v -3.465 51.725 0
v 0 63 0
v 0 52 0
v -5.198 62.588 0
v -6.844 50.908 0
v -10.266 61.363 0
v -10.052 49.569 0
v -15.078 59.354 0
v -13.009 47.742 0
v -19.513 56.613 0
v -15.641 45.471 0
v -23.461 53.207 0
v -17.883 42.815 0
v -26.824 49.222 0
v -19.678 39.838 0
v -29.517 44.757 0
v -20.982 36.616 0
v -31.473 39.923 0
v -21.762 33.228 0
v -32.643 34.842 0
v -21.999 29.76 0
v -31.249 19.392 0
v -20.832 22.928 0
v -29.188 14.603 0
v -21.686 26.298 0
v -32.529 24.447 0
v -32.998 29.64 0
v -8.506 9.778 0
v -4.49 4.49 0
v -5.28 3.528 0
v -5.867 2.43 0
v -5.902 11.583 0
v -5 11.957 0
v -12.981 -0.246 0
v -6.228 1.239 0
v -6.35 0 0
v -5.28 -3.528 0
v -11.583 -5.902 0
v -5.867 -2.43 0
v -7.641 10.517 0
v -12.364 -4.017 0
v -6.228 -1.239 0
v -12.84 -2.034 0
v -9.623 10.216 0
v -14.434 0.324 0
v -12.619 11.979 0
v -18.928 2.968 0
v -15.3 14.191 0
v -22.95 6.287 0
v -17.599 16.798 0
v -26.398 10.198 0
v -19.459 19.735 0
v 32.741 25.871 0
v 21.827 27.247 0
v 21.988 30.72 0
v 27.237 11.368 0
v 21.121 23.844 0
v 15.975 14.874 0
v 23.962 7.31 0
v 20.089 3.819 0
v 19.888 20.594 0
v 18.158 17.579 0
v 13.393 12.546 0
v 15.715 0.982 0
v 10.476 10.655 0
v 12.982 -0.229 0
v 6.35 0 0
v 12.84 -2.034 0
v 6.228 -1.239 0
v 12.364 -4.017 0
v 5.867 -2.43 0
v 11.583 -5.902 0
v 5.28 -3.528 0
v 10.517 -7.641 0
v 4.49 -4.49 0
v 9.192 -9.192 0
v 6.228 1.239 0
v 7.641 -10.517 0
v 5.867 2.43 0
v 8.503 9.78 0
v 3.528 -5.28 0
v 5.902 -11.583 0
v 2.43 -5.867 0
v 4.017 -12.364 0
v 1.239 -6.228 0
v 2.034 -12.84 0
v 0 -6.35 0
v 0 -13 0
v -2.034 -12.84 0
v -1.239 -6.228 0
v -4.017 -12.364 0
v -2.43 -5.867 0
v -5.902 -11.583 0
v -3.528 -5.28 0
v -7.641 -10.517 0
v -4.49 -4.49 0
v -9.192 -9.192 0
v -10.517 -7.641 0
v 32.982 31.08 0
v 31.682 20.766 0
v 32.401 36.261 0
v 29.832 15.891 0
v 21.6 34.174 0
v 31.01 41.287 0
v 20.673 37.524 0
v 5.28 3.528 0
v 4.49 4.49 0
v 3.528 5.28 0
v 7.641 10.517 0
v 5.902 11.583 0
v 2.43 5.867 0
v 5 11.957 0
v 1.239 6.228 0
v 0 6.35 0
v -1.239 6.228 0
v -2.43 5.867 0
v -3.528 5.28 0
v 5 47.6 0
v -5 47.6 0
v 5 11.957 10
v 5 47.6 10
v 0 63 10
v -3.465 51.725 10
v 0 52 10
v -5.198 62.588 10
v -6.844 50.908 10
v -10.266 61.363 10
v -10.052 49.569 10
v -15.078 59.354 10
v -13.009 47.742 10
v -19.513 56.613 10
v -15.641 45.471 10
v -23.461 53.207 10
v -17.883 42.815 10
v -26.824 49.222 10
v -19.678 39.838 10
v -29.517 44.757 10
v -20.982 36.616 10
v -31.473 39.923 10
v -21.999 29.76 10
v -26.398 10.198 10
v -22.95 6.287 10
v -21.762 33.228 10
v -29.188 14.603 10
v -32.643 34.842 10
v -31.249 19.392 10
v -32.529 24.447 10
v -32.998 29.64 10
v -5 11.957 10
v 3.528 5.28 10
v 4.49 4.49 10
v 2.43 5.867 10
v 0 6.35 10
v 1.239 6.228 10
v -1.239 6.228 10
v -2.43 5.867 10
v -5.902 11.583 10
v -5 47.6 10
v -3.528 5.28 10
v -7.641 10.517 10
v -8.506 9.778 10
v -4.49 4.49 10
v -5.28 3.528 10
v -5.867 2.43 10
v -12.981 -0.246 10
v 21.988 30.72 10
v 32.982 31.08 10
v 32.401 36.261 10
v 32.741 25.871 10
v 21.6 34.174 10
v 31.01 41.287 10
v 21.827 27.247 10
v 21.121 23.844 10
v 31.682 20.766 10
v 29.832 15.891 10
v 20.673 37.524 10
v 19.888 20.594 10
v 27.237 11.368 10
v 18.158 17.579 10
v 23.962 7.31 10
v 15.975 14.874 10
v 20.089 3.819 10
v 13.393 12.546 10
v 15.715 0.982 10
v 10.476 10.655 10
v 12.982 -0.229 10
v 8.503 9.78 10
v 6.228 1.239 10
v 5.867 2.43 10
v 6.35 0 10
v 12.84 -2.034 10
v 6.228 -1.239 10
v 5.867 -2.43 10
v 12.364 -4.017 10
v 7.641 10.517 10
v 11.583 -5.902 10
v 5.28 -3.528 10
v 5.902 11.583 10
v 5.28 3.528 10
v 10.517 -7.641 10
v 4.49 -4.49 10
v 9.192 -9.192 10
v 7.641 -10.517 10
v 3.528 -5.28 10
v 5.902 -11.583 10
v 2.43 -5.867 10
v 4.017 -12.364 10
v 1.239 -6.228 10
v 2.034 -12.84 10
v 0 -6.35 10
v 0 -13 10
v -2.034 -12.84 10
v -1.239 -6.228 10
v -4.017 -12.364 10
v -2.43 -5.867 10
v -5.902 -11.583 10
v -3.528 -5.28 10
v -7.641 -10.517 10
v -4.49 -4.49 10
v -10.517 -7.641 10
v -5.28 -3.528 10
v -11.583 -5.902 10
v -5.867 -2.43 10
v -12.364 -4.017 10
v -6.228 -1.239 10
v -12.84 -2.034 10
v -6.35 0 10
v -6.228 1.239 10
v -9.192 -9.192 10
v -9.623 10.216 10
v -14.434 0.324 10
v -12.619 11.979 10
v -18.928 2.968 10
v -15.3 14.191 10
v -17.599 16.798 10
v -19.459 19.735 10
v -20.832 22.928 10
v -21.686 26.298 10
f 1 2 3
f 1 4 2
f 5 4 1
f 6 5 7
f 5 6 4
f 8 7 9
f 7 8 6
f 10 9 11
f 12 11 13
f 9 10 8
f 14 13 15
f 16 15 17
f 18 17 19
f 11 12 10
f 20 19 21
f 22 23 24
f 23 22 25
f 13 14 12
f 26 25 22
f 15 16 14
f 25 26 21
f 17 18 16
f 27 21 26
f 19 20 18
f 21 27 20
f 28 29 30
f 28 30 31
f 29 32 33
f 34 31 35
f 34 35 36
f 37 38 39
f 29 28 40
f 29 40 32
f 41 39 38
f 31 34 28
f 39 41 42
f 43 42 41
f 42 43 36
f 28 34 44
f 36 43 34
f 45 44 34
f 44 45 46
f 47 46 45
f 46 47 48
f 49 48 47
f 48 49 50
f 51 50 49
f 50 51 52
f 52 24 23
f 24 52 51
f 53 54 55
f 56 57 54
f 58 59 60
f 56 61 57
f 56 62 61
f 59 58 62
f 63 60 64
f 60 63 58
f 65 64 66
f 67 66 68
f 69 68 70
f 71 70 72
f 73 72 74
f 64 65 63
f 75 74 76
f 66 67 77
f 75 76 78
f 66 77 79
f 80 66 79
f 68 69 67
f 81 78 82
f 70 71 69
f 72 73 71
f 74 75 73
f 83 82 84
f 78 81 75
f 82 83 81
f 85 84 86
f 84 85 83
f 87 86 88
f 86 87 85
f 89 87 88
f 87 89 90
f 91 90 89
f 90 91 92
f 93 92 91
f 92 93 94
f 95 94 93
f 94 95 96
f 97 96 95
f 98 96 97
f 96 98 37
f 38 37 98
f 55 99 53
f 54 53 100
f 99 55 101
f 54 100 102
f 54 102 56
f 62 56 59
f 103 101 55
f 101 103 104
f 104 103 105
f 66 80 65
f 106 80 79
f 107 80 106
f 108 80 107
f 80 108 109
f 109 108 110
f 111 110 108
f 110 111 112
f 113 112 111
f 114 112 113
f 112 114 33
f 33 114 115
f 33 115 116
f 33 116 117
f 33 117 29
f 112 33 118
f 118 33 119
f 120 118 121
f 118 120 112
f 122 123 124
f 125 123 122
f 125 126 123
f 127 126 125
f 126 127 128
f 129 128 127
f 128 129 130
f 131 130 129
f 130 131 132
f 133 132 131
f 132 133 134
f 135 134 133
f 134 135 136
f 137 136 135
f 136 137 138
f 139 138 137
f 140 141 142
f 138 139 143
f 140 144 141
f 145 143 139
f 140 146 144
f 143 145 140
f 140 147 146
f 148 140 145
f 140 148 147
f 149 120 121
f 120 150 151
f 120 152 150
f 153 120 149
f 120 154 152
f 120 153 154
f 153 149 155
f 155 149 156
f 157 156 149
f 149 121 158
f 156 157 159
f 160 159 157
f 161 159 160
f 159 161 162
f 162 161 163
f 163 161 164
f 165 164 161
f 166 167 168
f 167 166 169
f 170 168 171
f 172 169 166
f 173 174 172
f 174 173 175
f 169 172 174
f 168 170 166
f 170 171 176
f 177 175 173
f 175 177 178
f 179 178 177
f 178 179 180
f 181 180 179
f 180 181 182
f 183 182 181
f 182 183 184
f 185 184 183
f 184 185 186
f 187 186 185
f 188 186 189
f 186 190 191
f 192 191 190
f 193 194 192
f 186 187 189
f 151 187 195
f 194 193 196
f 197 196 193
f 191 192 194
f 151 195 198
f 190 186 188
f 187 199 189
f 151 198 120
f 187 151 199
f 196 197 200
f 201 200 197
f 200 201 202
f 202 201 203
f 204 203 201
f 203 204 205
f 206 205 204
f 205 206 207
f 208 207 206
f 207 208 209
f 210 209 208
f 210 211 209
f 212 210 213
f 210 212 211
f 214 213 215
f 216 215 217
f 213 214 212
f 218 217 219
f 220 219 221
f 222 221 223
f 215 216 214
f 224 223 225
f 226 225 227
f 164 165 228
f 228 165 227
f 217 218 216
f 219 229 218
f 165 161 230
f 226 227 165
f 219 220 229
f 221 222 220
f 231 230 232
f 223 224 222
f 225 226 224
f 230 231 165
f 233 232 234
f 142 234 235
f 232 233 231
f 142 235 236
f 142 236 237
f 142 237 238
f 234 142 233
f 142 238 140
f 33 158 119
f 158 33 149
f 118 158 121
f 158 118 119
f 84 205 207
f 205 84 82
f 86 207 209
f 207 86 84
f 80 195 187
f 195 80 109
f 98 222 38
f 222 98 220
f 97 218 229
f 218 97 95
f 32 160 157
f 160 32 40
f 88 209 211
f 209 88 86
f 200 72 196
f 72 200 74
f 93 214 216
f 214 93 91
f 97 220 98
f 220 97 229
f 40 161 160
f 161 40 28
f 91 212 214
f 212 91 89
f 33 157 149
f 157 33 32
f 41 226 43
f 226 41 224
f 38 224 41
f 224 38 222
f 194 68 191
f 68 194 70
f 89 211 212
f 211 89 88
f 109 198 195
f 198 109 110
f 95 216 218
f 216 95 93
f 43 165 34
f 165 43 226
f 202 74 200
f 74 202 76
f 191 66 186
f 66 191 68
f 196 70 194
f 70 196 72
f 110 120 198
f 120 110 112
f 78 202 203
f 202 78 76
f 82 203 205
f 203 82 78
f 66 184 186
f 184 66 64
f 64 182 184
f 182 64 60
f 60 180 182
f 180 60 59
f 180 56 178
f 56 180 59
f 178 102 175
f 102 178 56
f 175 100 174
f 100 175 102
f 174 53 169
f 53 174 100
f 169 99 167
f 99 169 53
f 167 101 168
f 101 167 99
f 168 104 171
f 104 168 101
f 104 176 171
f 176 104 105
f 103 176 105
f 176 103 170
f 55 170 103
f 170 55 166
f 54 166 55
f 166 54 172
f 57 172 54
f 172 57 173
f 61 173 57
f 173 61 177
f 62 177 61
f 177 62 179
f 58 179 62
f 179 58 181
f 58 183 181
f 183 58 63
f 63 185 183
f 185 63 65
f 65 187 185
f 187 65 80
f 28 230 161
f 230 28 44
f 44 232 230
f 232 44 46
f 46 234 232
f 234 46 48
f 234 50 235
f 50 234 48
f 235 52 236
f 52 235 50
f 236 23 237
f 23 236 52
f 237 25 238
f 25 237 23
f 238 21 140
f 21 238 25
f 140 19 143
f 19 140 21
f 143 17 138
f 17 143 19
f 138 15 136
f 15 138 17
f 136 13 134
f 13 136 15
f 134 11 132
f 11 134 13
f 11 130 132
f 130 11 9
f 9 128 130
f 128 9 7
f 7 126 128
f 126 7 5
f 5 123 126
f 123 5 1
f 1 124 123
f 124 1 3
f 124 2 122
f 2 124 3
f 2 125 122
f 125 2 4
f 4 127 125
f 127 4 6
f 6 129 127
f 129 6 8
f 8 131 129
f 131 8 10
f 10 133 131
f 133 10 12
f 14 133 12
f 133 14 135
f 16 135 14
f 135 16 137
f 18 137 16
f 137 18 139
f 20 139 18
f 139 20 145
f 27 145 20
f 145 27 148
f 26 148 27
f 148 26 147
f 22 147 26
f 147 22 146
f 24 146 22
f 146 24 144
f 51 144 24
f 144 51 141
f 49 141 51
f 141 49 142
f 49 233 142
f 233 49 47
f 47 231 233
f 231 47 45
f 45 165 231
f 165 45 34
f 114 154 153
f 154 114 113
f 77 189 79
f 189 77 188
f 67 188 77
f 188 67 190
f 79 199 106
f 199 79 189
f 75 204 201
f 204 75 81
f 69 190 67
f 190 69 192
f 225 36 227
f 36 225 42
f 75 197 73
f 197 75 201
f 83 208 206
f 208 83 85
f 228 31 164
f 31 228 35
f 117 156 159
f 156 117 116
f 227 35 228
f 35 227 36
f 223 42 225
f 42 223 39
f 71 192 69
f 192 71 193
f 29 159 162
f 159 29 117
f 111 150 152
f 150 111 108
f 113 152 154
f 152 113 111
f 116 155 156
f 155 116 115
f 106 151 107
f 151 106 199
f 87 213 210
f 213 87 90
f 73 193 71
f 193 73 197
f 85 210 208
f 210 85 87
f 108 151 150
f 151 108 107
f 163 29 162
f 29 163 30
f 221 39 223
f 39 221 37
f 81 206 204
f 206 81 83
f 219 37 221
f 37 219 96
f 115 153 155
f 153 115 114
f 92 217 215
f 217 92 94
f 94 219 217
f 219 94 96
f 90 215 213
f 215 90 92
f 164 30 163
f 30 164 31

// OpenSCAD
$fn = 32;

// ----------------------------------------------------------------------
// Hook: 60 mm shank into a 22 mm curl, 10 mm thick
// ----------------------------------------------------------------------

// --- parameters (mm) ---
shank_len = 60;           // shank length from the boss centre
shank_w = 10;             // shank width
boss_d = 26;              // boss diameter
bore_d = 12.7;            // boss bore
curl_in = 22;             // curl inner radius
curl_out = 33;            // curl outer radius
curl_sweep = 290;         // curl sweep angle
hook_t = 10;              // hook thickness

shank_profile = [[-5, 47.6], [5, 47.6], [5, 11], [-5, 11]];
boss_profile = [[13, 0], [12.84, 2.034], [12.364, 4.017], [11.583, 5.902], [10.517, 7.641], [9.192, 9.192], [7.641, 10.517], [5.902, 11.583], [4.017, 12.364], [2.034, 12.84], [0, 13], [-2.034, 12.84], [-4.017, 12.364], [-5.902, 11.583], [-7.641, 10.517], [-9.192, 9.192], [-10.517, 7.641], [-11.583, 5.902], [-12.364, 4.017], [-12.84, 2.034], [-13, 0], [-12.84, -2.034], [-12.364, -4.017], [-11.583, -5.902], [-10.517, -7.641], [-9.192, -9.192], [-7.641, -10.517], [-5.902, -11.583], [-4.017, -12.364], [-2.034, -12.84], [0, -13], [2.034, -12.84], [4.017, -12.364], [5.902, -11.583], [7.641, -10.517], [9.192, -9.192], [10.517, -7.641], [11.583, -5.902], [12.364, -4.017], [12.84, -2.034]];
curl_profile = [[0, 63], [-5.198, 62.588], [-10.266, 61.363], [-15.078, 59.354], [-19.513, 56.613], [-23.461, 53.207], [-26.824, 49.222], [-29.517, 44.757], [-31.473, 39.923], [-32.643, 34.842], [-32.998, 29.64], [-32.529, 24.447], [-31.249, 19.392], [-29.188, 14.603], [-26.398, 10.198], [-22.95, 6.287], [-18.928, 2.968], [-14.434, 0.324], [-9.579, -1.579], [-4.486, -2.694], [0.72, -2.992], [5.908, -2.467], [10.948, -1.131], [15.715, 0.982], [20.089, 3.819], [23.962, 7.31], [27.237, 11.368], [29.832, 15.891], [31.682, 20.766], [32.741, 25.871], [32.982, 31.08], [32.401, 36.261], [31.01, 41.287], [20.673, 37.524], [21.6, 34.174], [21.988, 30.72], [21.827, 27.247], [21.121, 23.844], [19.888, 20.594], [18.158, 17.579], [15.975, 14.874], [13.393, 12.546], [10.476, 10.655], [7.298, 9.246], [3.938, 8.355], [0.48, 8.005], [-2.99, 8.204], [-6.386, 8.947], [-9.623, 10.216], [-12.619, 11.979], [-15.3, 14.191], [-17.599, 16.798], [-19.459, 19.735], [-20.832, 22.928], [-21.686, 26.298], [-21.999, 29.76], [-21.762, 33.228], [-20.982, 36.616], [-19.678, 39.838], [-17.883, 42.815], [-15.641, 45.471], [-13.009, 47.742], [-10.052, 49.569], [-6.844, 50.908], [-3.465, 51.725], [0, 52]];

difference() {
  union() {
    /* three overlapping outlines: shank, boss and the smooth curl */
    linear_extrude(height = hook_t) polygon(shank_profile);
    linear_extrude(height = hook_t) polygon(boss_profile);
    linear_extrude(height = hook_t) polygon(curl_profile);
  }
  translate([0, 0, -2.5]) cylinder(h = hook_t + 5, d = bore_d);
}
